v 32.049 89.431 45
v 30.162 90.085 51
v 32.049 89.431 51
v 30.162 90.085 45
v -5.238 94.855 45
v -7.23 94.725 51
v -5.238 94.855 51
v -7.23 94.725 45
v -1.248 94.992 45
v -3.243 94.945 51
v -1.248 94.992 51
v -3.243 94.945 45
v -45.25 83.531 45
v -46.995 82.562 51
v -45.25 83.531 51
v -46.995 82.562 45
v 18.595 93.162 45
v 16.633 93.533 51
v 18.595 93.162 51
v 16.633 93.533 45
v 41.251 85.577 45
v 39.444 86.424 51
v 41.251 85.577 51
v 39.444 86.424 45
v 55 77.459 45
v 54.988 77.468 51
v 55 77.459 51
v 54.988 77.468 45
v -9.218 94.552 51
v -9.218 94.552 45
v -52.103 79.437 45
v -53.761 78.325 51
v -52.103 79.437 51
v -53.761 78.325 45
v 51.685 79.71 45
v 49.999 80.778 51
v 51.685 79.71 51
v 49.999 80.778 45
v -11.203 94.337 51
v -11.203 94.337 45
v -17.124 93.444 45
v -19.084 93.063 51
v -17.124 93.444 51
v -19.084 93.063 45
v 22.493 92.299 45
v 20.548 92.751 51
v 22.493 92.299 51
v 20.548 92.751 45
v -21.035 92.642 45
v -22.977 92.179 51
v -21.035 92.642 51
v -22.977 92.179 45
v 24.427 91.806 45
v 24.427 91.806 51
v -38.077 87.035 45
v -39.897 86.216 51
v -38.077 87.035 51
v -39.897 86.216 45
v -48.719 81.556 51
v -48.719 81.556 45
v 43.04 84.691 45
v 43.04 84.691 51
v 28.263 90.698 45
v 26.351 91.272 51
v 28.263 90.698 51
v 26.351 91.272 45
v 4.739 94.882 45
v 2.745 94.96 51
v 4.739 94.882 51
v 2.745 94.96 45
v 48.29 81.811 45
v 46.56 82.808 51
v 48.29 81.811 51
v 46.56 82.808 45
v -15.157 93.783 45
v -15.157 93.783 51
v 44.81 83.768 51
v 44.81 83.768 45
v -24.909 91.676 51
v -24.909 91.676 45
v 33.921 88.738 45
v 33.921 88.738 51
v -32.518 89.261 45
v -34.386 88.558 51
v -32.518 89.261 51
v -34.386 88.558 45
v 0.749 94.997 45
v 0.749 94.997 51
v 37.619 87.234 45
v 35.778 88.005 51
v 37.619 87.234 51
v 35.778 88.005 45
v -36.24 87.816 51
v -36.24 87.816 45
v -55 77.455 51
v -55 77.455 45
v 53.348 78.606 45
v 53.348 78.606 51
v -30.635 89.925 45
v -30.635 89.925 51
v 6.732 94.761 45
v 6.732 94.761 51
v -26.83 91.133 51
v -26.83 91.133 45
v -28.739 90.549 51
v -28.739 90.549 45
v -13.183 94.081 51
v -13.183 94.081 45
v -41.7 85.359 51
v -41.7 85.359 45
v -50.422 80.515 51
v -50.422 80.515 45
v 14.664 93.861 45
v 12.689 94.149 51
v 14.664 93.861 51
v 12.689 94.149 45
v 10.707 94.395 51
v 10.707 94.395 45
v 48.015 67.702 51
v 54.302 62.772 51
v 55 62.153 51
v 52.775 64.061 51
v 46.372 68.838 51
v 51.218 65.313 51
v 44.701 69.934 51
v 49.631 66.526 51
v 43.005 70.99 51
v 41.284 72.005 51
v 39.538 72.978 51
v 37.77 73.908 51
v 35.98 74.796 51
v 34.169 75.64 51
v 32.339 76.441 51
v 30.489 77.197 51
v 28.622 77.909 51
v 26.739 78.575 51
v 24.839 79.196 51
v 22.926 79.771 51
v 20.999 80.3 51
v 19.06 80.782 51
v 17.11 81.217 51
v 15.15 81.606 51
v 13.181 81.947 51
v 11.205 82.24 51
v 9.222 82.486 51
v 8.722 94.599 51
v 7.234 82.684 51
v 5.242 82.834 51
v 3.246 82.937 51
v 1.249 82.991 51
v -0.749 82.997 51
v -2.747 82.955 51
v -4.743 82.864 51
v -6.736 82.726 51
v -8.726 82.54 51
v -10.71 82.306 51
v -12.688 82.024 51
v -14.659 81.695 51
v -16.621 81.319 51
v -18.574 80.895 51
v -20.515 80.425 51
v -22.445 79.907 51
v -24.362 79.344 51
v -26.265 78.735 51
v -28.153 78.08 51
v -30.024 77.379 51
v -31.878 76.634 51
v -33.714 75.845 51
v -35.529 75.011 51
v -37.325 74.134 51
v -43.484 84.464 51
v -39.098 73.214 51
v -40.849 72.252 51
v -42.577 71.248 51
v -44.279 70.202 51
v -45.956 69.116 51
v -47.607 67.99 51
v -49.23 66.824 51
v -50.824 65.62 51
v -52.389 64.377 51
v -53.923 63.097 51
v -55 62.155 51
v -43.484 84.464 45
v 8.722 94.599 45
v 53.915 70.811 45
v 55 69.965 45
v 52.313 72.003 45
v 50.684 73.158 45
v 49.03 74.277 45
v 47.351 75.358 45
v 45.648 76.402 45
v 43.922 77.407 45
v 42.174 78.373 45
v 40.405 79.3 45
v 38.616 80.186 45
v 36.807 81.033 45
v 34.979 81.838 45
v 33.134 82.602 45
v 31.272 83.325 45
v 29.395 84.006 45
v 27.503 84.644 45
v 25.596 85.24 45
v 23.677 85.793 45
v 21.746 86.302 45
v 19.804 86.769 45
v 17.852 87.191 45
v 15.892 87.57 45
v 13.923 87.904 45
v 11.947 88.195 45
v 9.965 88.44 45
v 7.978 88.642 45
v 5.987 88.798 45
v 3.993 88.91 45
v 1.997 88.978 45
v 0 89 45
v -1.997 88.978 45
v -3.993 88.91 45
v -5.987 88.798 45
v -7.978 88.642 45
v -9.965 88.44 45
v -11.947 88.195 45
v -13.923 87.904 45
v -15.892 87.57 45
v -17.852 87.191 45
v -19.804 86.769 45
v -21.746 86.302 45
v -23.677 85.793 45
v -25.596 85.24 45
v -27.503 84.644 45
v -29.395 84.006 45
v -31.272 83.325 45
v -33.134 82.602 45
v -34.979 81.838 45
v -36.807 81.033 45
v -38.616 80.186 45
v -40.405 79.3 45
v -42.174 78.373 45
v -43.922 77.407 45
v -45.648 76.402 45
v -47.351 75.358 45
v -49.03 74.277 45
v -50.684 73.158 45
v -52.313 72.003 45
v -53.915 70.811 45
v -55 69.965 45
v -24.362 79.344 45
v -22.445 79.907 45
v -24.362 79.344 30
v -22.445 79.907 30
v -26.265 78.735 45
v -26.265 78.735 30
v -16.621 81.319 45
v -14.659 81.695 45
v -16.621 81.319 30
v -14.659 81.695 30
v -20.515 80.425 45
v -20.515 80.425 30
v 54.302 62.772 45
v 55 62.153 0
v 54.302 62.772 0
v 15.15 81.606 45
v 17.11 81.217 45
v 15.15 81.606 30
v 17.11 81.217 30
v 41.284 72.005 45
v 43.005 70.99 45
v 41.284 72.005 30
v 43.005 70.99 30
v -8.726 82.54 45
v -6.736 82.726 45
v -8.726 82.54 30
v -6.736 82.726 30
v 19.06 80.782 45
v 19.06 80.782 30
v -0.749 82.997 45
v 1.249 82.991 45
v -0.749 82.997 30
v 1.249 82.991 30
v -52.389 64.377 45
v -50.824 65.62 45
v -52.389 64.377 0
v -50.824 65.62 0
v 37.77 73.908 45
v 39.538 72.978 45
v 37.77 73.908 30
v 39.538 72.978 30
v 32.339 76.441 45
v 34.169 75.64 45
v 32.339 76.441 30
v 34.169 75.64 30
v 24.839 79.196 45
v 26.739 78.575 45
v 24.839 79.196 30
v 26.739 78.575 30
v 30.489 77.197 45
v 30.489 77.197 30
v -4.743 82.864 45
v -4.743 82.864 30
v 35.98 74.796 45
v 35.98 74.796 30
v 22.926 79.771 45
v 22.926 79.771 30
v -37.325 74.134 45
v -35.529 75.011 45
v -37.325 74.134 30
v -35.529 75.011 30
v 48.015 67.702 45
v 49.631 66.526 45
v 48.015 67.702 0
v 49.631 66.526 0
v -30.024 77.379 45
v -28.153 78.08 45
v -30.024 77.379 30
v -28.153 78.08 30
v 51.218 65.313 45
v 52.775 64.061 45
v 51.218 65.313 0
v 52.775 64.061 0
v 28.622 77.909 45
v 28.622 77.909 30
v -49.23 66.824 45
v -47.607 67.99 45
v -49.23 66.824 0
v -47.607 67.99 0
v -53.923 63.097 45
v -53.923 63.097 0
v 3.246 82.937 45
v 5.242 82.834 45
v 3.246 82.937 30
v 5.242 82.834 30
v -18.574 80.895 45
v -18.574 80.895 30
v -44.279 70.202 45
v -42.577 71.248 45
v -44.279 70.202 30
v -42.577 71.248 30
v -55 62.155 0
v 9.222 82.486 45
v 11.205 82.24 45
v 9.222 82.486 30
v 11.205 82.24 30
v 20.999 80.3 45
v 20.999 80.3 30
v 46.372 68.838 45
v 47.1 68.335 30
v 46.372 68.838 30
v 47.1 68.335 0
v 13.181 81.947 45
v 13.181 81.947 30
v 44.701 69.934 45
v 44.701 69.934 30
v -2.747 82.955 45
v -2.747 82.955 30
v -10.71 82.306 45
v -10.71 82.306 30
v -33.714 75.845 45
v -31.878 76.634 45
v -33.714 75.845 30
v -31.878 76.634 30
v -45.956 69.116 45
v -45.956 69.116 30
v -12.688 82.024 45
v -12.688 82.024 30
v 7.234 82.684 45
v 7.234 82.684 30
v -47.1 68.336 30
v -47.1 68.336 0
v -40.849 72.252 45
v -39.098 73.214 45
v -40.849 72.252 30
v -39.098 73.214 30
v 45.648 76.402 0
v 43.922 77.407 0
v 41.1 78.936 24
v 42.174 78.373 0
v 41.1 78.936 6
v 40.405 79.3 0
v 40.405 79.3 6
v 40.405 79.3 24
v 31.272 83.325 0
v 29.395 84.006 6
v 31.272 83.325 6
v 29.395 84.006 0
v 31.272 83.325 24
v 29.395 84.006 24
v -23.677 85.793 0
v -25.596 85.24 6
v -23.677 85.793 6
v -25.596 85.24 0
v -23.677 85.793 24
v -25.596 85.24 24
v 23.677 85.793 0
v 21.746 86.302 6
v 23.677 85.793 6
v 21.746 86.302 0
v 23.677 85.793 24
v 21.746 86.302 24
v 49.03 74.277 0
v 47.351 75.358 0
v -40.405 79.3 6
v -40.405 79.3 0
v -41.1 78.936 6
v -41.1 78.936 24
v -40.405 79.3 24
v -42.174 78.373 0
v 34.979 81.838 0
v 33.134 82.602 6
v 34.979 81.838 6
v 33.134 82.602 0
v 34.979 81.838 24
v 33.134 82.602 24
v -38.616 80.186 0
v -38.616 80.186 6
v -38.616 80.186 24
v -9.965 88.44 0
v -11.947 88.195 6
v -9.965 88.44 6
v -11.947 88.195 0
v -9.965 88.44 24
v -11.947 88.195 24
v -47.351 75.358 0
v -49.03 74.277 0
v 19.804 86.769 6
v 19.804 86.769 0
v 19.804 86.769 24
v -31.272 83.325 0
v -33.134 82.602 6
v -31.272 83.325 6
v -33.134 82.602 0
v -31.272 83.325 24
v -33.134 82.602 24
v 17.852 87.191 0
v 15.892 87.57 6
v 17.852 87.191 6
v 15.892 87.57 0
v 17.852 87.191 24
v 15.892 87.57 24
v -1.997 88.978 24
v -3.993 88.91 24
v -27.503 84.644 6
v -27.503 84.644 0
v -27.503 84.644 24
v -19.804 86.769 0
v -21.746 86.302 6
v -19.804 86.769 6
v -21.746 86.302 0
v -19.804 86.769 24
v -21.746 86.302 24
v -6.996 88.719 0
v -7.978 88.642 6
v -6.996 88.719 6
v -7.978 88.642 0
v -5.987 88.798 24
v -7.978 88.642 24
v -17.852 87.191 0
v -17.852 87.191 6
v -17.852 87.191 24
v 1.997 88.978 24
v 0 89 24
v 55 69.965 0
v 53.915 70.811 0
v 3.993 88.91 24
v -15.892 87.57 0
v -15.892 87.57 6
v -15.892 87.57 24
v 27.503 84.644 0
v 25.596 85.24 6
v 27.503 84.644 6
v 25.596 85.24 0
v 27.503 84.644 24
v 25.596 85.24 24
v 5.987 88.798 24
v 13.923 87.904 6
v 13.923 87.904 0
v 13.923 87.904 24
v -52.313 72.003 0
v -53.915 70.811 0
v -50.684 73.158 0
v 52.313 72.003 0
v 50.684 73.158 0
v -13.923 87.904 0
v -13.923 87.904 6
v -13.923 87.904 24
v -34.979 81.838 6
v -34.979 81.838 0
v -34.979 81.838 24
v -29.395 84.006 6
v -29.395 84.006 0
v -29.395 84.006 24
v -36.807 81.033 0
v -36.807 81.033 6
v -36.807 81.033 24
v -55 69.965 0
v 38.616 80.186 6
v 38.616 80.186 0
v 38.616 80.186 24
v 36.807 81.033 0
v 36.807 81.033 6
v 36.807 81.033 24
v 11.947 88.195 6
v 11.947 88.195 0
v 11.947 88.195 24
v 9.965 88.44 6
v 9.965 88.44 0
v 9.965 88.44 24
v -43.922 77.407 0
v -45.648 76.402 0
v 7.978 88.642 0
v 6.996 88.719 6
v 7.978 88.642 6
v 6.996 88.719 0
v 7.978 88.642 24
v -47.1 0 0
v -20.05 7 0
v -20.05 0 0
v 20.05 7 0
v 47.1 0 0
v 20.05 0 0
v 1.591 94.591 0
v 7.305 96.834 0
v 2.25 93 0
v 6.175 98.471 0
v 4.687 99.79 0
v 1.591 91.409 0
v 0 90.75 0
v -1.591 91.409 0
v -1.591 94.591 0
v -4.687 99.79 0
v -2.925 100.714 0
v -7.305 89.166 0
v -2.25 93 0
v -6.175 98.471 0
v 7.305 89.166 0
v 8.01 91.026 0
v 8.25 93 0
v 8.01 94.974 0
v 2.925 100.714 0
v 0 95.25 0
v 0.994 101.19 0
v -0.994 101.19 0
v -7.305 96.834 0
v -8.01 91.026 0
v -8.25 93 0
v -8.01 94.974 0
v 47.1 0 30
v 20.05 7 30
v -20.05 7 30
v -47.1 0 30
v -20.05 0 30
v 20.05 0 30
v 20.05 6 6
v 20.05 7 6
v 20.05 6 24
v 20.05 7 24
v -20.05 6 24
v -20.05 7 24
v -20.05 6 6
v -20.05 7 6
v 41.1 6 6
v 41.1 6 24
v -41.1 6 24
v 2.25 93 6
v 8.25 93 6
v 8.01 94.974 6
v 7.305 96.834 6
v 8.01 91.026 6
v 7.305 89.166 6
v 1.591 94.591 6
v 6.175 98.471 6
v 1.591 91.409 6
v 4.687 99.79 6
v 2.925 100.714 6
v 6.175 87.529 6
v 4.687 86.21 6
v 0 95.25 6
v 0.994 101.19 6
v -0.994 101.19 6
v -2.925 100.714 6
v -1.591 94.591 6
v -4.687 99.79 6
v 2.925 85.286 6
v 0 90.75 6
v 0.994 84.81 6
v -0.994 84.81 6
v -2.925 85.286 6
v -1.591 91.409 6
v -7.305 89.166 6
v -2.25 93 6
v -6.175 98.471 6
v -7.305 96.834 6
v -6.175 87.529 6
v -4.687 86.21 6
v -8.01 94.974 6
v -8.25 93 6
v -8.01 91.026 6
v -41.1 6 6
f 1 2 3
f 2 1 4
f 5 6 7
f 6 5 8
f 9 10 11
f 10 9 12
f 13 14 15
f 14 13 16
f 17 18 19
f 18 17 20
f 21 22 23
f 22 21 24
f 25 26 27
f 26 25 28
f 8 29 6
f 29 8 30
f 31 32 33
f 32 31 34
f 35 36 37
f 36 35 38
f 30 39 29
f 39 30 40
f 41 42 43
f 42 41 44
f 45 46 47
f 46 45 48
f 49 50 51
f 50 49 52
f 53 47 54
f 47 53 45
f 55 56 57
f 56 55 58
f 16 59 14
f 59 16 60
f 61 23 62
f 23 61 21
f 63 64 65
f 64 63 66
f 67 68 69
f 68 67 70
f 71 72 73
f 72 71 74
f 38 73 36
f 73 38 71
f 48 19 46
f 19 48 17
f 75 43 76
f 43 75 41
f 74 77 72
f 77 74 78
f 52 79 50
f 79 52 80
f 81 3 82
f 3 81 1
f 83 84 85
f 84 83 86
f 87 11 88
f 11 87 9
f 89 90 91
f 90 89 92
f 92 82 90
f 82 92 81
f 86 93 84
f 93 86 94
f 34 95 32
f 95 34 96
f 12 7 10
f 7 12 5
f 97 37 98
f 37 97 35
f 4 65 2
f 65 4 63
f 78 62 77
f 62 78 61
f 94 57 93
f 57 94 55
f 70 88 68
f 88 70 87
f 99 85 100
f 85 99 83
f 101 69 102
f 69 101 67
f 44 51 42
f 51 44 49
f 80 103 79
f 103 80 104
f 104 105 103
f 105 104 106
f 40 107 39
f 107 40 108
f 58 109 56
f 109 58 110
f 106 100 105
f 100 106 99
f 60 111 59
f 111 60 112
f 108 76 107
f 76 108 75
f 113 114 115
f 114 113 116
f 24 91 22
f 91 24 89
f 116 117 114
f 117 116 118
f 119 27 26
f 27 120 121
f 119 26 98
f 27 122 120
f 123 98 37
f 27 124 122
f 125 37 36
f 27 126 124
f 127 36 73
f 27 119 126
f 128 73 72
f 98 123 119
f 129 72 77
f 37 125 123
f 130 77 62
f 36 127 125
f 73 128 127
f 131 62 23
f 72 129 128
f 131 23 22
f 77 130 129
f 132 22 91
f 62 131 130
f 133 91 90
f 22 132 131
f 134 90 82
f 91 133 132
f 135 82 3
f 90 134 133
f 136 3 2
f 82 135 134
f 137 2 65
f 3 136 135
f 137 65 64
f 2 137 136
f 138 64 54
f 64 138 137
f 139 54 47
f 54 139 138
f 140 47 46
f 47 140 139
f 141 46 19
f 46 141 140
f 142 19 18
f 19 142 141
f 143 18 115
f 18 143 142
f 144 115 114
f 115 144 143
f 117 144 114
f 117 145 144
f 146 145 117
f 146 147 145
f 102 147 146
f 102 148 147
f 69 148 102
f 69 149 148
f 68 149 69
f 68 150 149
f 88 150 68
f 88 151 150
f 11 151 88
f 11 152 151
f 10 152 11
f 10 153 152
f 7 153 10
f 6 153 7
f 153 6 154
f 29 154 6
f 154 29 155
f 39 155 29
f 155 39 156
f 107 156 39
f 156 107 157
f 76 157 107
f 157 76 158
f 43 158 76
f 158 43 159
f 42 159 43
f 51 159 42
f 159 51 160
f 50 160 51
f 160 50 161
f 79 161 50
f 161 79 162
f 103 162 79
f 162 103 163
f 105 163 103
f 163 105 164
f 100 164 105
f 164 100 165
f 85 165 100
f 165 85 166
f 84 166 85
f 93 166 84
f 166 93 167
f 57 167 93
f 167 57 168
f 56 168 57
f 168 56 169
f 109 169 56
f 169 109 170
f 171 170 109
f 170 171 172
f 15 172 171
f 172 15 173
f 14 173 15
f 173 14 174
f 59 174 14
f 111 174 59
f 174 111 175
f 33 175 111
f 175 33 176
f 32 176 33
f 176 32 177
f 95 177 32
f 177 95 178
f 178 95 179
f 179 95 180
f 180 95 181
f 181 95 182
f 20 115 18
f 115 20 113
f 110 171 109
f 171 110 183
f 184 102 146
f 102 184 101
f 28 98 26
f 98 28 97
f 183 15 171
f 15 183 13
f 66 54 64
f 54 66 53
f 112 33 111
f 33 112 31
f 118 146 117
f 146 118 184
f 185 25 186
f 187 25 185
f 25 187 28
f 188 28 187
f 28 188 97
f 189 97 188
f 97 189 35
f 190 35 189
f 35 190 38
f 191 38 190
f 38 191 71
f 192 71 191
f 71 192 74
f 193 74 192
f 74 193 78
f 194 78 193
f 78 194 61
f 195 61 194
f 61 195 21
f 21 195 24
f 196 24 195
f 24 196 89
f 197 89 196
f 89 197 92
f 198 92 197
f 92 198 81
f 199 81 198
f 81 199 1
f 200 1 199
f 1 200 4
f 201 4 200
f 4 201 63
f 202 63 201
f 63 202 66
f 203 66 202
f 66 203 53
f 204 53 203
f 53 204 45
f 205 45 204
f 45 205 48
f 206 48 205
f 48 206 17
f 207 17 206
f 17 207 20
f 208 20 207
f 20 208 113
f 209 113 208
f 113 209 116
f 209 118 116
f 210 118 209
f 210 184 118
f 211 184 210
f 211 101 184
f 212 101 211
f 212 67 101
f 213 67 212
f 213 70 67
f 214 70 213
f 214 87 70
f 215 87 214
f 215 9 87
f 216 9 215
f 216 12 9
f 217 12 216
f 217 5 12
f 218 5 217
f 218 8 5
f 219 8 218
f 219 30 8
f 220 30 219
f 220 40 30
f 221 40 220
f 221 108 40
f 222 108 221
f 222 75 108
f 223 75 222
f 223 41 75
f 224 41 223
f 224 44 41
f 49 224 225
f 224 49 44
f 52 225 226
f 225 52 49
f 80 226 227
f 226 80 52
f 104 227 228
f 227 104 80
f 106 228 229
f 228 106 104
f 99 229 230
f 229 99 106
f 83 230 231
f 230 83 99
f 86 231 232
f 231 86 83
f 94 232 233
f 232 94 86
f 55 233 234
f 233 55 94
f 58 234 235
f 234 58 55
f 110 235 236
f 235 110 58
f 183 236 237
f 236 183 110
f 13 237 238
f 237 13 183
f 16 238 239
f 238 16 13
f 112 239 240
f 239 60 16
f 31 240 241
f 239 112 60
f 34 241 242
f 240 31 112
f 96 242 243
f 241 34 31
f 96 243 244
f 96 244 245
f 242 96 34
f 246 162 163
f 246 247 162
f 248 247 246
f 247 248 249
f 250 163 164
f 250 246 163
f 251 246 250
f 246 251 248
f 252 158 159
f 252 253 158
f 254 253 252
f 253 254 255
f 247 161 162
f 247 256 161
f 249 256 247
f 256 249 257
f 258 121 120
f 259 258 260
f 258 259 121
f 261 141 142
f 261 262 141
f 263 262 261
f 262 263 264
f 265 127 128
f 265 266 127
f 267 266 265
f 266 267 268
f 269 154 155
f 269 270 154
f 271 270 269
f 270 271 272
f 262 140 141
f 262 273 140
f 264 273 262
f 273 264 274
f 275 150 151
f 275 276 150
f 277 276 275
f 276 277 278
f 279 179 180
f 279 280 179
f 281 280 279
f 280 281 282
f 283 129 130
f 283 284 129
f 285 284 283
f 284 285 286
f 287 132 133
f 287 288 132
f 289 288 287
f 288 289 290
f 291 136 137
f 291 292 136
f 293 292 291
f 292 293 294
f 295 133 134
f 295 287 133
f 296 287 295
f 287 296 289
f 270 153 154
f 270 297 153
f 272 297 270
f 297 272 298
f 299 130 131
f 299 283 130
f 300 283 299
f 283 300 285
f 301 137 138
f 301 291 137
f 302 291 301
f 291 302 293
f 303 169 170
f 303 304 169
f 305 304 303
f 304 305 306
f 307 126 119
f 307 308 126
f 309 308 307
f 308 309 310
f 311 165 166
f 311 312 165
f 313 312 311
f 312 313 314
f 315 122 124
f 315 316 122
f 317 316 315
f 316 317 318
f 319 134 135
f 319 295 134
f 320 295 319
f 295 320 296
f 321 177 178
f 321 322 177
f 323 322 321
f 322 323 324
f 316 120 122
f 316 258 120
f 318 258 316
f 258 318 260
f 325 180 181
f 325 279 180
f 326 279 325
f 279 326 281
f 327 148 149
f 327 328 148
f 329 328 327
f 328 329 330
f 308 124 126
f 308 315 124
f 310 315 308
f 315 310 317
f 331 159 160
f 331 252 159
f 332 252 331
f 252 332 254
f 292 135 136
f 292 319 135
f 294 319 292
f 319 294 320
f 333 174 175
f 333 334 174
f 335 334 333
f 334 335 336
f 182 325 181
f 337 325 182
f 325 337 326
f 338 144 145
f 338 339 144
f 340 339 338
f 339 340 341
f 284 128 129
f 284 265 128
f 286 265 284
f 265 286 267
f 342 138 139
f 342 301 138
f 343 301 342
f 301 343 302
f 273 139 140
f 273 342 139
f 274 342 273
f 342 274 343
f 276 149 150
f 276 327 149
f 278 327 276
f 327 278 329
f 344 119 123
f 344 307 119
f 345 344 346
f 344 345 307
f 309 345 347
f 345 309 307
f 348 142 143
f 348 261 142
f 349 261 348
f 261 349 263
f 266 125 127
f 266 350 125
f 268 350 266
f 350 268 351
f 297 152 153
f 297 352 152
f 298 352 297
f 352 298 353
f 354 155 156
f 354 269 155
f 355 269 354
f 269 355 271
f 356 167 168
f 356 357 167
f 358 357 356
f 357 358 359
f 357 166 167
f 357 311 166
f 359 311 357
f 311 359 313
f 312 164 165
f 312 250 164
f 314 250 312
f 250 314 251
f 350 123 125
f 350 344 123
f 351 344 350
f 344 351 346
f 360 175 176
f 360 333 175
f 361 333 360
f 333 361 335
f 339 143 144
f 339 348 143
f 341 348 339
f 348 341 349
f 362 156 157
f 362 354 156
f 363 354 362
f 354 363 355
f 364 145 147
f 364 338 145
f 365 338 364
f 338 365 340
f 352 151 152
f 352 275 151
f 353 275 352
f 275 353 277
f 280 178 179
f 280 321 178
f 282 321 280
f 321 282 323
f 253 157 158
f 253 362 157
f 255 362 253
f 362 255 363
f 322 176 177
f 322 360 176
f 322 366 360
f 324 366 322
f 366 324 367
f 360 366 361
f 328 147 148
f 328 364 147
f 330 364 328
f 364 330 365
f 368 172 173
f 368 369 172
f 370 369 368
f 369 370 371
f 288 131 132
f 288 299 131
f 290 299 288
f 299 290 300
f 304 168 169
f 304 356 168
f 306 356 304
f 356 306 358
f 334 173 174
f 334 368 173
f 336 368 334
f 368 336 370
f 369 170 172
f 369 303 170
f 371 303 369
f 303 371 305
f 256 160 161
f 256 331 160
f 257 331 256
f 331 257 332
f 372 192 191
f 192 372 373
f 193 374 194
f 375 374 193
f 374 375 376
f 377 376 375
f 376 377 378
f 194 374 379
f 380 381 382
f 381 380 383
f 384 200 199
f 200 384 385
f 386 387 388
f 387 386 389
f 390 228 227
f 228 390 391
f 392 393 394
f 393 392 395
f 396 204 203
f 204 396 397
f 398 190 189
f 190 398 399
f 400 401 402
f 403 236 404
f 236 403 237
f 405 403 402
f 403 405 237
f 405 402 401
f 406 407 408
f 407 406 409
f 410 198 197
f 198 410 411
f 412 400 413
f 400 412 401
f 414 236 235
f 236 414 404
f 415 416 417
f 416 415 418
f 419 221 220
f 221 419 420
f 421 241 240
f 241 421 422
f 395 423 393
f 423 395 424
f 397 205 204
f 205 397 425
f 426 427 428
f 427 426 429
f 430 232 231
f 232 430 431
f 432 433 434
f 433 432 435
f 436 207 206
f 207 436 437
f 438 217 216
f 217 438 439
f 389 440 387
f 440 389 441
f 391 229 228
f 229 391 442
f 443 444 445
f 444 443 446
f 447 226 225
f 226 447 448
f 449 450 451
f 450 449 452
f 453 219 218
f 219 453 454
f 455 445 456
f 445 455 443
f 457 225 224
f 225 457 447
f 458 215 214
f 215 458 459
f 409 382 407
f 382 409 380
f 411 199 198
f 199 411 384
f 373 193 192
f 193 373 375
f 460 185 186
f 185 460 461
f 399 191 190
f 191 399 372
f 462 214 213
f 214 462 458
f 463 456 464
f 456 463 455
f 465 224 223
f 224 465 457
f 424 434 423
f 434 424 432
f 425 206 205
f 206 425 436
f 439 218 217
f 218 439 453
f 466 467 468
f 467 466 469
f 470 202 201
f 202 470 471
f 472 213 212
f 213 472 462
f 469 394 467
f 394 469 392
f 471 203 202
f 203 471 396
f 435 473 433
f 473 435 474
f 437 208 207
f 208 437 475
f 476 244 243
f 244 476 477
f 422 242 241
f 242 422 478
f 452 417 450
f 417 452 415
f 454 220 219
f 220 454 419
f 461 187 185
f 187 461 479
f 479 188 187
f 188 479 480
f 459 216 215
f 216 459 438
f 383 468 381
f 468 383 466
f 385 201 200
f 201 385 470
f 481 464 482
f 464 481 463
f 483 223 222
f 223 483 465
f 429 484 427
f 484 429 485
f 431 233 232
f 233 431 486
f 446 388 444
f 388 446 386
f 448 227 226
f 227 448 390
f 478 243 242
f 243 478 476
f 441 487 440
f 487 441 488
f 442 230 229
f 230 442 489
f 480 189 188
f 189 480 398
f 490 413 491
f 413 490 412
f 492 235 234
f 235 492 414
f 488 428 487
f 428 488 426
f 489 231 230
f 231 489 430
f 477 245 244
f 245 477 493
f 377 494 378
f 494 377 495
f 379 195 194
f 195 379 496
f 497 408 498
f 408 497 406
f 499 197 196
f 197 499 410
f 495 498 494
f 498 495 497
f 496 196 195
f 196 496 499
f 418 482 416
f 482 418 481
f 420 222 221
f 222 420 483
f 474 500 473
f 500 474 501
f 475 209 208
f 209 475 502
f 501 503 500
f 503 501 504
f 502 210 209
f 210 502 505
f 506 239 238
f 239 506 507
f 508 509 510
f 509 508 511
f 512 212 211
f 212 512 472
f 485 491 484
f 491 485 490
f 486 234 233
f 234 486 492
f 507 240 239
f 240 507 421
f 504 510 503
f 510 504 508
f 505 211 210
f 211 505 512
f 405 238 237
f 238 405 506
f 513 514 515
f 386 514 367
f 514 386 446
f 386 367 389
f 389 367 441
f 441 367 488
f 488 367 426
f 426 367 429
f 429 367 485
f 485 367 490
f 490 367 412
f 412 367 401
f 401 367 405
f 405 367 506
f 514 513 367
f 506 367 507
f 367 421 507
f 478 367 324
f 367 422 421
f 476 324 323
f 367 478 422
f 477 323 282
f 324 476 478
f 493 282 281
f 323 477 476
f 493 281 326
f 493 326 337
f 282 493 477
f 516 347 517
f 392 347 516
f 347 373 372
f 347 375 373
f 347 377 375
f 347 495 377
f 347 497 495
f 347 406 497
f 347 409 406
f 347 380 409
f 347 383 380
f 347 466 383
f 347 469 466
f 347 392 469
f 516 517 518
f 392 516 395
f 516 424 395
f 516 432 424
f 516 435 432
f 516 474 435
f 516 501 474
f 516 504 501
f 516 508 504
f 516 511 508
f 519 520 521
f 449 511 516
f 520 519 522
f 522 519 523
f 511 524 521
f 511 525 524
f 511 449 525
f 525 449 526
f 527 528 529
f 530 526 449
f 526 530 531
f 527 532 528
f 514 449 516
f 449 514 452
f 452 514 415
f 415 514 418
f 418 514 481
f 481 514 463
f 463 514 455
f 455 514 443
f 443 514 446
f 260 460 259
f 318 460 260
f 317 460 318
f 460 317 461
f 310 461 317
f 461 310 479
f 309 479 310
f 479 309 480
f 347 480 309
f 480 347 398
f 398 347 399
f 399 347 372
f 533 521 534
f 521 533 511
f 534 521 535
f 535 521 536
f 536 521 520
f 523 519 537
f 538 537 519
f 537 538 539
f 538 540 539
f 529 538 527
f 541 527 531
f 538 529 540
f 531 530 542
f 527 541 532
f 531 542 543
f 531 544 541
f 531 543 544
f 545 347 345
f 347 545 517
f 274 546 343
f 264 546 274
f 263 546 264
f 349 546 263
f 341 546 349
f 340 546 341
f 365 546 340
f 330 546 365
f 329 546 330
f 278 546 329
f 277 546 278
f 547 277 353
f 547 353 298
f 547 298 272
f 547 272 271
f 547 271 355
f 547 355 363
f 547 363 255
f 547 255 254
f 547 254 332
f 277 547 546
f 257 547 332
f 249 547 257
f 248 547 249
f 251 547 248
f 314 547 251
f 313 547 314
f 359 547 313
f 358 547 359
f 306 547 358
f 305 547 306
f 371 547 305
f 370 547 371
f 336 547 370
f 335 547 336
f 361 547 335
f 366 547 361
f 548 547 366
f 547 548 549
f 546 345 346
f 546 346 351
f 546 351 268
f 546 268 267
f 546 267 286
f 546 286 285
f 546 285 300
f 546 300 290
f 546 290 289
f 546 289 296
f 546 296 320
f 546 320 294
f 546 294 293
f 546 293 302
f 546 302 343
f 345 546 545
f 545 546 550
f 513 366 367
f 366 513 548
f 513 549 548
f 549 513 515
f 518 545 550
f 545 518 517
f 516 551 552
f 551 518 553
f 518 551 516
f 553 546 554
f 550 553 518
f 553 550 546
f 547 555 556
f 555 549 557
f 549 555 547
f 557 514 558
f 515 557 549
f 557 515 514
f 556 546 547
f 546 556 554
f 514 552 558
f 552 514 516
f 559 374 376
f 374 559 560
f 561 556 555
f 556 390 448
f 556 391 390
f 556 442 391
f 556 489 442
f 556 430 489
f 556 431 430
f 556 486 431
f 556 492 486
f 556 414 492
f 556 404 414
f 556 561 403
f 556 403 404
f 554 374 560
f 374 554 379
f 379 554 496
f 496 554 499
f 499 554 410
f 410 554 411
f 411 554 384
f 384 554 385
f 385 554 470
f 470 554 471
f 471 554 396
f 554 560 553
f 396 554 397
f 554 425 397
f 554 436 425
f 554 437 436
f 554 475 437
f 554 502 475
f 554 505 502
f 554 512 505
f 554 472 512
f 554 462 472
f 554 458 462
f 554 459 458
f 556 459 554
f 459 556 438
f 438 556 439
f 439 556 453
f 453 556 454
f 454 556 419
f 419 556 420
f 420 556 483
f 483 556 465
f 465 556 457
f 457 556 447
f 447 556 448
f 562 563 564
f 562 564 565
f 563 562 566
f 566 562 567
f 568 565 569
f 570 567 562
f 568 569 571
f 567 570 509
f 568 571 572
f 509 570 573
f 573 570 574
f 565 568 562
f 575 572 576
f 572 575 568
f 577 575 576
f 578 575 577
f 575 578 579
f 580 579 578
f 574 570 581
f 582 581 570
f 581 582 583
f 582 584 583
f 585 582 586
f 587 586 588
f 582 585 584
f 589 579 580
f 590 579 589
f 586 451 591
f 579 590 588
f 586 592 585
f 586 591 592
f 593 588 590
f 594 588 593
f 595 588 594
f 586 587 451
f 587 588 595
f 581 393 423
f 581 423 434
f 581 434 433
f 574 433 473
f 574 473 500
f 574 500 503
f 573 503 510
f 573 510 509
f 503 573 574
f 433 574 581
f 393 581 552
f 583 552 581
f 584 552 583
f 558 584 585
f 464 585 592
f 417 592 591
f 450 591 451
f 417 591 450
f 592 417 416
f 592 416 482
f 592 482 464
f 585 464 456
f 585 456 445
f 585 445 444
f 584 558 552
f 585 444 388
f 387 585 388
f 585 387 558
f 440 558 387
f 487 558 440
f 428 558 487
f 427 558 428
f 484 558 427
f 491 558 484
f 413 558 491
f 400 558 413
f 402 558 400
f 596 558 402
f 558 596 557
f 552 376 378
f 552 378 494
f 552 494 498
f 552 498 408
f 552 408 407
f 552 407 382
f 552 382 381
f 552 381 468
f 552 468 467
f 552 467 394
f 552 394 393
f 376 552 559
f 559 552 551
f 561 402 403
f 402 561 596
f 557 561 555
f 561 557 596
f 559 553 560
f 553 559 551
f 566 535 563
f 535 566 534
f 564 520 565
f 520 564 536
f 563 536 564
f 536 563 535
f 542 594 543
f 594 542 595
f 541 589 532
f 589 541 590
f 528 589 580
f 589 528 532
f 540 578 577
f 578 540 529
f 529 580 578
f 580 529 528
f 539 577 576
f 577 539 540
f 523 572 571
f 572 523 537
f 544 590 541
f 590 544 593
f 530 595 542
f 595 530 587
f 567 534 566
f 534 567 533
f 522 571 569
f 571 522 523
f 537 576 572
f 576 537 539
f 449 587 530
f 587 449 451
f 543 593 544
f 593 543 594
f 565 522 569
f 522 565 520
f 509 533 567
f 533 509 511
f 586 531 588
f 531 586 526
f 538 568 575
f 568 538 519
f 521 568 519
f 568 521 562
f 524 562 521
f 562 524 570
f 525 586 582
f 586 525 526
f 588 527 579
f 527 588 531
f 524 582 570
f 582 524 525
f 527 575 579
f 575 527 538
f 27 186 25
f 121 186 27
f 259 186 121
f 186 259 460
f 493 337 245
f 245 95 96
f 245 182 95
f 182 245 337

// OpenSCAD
WALL_THICK=6;

OUTER_RADIUS = 89;
PLATFORM_WIDTH = 45;
  
INNER_RADIUS = OUTER_RADIUS - WALL_THICK;

PHONE_WIDE = 80.2;
PHONE_THICK = 16;
PHONE_HEIGHT = 155;

SLOP = 1;

module headphoneRing()
{
  
  
  
  // Need to make the lip on the front  
  difference()
  {
    cylinder(h=(PLATFORM_WIDTH + WALL_THICK), r=(OUTER_RADIUS + WALL_THICK));
    
    translate([0,0,-1])
      cylinder(h=PLATFORM_WIDTH + 1, r = (OUTER_RADIUS + WALL_THICK + 1)); 
    
    translate([0,0,-1])
      cylinder(h=(PLATFORM_WIDTH + WALL_THICK + 2), r = INNER_RADIUS);
  }  
  
  // Now making the main holder body
  difference()
  {
    cylinder(h=(PLATFORM_WIDTH + 1), r = OUTER_RADIUS);
    
    translate([0,0,-1])
      cylinder(h=(PLATFORM_WIDTH + 3), r = INNER_RADIUS);
  }  
    
  
}

module headphoneHolder()
{
  rotate(a=45, v=[0,0,1])
  
  difference()
  {
    headphoneRing();
    
    translate([0,0,-1])
    difference()
    {
      cylinder(h=(PLATFORM_WIDTH + WALL_THICK + 5), r = (OUTER_RADIUS + WALL_THICK + 3));
      cube([OUTER_RADIUS + WALL_THICK + 5, 
            OUTER_RADIUS + WALL_THICK + 5, 
            PLATFORM_WIDTH + WALL_THICK + 8]);
      
    }
  }

}

module androidLogo(thick)
{
  translate([0,0,-1])
  difference()
  {  
    translate([-53/2,0,thick + 1])
      resize([53,64,thick + 1])
        //cube([1,1,1])
        surface(file="android-logo.png", invert=true);
    
    translate([-100,-1,-1])
      cube([200, 65, 3]);
  }
}

module phoneHolderShell()
{
  SHELL_WIDTH = PHONE_WIDE + WALL_THICK * 2 + SLOP * 2;
  SHELL_HEIGHT = PHONE_HEIGHT;
  SHELL_THICK = PHONE_THICK + WALL_THICK * 2 + SLOP * 2;
  
  difference()
  {
    intersection()
    {
      translate([-SHELL_WIDTH / 2,0,0])
        cube([SHELL_WIDTH, SHELL_HEIGHT, SHELL_THICK]);
  
      translate([0,0,-1])
        cylinder(h=SHELL_THICK + 2, r = INNER_RADIUS + 1);
    }
    
    translate([0,10,WALL_THICK + PHONE_THICK - 2 + SLOP * 2])
      androidLogo(WALL_THICK + 4);
    
    translate([-PHONE_WIDE / 4, -1, -1])
      cube([PHONE_WIDE / 2, WALL_THICK + 2, SHELL_THICK + 2]);
  }
  
}

module phoneCavity()
{
  CAVITY_WIDTH = PHONE_WIDE + SLOP * 2;
  CAVITY_HEIGHT = PHONE_HEIGHT;
  CAVITY_THICK = PHONE_THICK + SLOP * 2;
  
  translate([-CAVITY_WIDTH / 2, WALL_THICK, WALL_THICK])
     cube([CAVITY_WIDTH, CAVITY_HEIGHT, CAVITY_THICK]);
  
}

module wallmount()
{
  HOLE_DIA = 4.5;
  difference()
  {
    cylinder(r=HOLE_DIA / 2 + WALL_THICK, h=WALL_THICK);
    
    translate([0,0,-1])
    cylinder(r=HOLE_DIA / 2, h = WALL_THICK + 2);
  }
}

module wholeModel()
{
  difference()
  {
    union()
    {
      headphoneHolder();
      phoneHolderShell();
    }
  
    phoneCavity();
  }

  translate([0,OUTER_RADIUS + WALL_THICK - 2,0])
    wallmount();

  
}

module bottomPrintable()
{
  CAVITY_WIDTH = WALL_THICK + PHONE_WIDE + SLOP * 2;
  
  difference()
  {
    wholeModel();
    
    translate([-CAVITY_WIDTH/2, WALL_THICK/2, WALL_THICK + SLOP * 2 + PHONE_THICK - .01])
      cube([CAVITY_WIDTH, 100, 100]);
    
    translate([-100,58,WALL_THICK + SLOP * 2 + PHONE_THICK - .01])
      cube([200, 100, 100]);
  }
}

module topPrintable()
{
  CAVITY_WIDTH = WALL_THICK + PHONE_WIDE + SLOP * 2;
  
  intersection()
  {
    wholeModel();
    
    union()
    {
      translate([-CAVITY_WIDTH/2, WALL_THICK/2, WALL_THICK + SLOP * 2 + PHONE_THICK])
        cube([CAVITY_WIDTH, 100, 100]);
    
      translate([-100,58,WALL_THICK + SLOP * 2 + PHONE_THICK])
        cube([200, 100, 100]);
    }
  }
}

module printerConstraints()
{
  // I have a monoprice mini, with 120x120x120 build platform
  translate([-55,-1,0])
    cube([110,110,110]);
}


$fa=1;

intersection()
{
  printerConstraints();
  
  // Determines what to show / print.  Uncomment 1 of the following lines
  wholeModel();
  // topPrintable();
  // bottomPrintable();  
  
}
